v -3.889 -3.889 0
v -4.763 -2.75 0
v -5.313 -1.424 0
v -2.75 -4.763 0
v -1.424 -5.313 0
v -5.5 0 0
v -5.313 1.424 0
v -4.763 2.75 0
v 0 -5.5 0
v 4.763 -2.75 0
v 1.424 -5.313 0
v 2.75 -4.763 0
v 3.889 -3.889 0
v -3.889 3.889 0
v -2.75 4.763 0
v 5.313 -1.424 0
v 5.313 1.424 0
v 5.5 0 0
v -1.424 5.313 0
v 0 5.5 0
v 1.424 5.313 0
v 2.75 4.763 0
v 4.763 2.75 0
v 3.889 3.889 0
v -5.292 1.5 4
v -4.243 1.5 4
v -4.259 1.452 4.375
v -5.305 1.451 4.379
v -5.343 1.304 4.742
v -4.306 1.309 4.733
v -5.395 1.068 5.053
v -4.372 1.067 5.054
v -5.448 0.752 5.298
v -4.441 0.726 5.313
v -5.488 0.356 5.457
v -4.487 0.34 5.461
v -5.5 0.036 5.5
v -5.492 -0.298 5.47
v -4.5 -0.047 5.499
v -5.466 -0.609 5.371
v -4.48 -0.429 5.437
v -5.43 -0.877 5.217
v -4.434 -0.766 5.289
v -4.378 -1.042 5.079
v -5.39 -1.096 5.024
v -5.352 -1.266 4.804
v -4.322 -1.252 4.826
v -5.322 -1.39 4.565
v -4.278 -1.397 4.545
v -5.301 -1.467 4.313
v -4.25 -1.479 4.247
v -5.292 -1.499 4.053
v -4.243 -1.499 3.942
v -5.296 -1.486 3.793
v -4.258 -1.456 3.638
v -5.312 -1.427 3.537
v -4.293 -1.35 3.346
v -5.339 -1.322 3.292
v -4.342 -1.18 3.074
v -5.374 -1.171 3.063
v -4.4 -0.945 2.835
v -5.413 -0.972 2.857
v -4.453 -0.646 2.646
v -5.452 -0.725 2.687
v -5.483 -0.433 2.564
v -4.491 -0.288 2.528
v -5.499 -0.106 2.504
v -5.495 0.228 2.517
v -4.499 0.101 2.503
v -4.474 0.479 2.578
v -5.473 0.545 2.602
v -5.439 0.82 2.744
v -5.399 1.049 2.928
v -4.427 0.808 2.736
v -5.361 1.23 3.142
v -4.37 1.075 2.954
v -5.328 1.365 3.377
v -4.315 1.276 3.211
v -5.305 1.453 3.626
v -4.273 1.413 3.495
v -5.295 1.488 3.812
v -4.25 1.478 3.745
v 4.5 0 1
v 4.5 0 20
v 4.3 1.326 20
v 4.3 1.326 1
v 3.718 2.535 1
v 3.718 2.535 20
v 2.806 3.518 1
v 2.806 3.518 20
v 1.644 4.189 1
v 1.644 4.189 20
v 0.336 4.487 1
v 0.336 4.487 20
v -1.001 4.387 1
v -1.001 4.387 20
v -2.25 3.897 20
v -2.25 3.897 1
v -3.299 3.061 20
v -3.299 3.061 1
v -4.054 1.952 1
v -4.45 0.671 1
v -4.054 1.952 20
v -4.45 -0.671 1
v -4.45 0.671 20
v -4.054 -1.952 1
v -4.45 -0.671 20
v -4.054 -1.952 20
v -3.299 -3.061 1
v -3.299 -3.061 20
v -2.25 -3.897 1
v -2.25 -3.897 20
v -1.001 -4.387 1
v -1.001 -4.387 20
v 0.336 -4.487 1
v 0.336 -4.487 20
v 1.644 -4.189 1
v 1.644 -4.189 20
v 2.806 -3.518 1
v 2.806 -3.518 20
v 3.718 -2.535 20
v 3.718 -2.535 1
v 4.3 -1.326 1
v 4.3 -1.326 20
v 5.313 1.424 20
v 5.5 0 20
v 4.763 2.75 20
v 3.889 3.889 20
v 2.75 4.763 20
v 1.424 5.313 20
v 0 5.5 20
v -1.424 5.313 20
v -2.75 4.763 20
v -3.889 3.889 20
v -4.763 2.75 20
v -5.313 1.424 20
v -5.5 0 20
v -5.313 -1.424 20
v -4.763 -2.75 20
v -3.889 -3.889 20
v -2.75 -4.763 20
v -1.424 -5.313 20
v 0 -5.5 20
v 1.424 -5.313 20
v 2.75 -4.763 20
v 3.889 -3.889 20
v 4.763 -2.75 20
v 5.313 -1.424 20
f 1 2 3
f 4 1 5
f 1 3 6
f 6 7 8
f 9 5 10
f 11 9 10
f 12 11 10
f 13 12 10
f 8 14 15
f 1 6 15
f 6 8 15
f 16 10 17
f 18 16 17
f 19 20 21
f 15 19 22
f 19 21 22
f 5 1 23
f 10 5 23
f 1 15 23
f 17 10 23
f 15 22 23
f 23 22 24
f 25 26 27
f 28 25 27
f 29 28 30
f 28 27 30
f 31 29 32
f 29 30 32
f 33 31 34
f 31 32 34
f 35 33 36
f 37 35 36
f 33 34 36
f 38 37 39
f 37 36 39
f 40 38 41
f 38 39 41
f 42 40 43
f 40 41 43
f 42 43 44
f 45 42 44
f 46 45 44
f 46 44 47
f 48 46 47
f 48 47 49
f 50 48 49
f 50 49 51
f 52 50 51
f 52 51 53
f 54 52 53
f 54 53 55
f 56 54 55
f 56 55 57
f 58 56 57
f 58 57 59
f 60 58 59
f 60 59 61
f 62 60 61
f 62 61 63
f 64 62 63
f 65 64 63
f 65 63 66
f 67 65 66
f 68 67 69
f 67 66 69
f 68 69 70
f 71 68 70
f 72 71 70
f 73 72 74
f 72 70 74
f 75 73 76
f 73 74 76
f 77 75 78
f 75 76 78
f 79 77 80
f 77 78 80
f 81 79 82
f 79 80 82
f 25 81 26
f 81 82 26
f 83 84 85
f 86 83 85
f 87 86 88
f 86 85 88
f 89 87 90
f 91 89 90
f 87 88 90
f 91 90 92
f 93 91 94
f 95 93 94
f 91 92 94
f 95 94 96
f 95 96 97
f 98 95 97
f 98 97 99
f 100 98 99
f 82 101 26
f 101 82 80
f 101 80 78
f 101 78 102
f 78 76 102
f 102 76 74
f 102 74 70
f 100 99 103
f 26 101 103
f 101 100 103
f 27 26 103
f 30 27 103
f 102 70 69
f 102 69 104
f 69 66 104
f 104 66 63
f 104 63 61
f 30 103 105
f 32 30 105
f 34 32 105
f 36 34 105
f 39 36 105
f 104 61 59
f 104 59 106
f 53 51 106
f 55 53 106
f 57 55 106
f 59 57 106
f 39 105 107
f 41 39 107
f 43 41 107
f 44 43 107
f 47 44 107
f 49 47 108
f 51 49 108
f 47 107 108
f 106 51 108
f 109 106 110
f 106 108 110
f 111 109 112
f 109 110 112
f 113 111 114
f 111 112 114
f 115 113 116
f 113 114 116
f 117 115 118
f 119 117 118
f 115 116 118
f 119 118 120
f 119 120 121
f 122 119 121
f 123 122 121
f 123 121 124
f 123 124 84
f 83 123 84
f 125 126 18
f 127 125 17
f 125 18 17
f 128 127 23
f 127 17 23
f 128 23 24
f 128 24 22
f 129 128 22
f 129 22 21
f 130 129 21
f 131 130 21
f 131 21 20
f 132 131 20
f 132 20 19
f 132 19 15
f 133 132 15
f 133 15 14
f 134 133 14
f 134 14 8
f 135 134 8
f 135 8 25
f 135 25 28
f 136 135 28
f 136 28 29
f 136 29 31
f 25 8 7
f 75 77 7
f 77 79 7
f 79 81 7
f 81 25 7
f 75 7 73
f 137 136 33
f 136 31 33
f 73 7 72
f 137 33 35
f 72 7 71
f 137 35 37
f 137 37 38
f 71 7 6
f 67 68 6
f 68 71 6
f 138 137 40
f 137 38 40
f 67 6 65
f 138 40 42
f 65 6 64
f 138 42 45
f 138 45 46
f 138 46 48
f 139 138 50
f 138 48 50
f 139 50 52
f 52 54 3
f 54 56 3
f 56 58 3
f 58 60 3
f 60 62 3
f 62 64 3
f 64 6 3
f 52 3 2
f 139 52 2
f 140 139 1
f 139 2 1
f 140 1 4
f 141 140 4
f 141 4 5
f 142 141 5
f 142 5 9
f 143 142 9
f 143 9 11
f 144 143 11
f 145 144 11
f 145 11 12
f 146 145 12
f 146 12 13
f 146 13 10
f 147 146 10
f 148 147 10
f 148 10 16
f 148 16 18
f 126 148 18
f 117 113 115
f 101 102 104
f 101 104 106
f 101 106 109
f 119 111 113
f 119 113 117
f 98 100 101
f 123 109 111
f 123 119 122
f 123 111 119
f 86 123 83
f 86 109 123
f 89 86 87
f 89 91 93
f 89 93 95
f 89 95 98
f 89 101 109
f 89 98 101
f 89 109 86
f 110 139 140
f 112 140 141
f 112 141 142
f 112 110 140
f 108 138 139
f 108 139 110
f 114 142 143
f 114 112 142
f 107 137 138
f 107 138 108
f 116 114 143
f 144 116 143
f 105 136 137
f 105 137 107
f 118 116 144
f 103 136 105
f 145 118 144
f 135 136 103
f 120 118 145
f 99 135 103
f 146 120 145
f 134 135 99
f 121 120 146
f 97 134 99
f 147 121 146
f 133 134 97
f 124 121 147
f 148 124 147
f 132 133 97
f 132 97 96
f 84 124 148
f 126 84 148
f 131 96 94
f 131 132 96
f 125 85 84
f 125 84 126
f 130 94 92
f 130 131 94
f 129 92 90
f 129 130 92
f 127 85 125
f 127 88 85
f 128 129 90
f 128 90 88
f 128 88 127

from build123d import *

# Parameters (mm, degrees)
F0_R     = 5.5
F1_DEPTH = 20
F2_R     = 4.5
F3_DEPTH = 19
F4_R     = 1.5
F5_DEPTH = 25


with BuildPart() as f1:
    # F0 (on Top) → F1 (new body)
    with BuildSketch(Plane.XY):
        Circle(F0_R)
    extrude(amount=F1_DEPTH)

    # F2 (on face) → F3 (cut)
    with BuildSketch(Plane.XY.offset(20)):
        Circle(F2_R)
    extrude(amount=-F3_DEPTH, mode=Mode.SUBTRACT)

    # F4 (on Right) → F5 (cut)
    with BuildSketch(Plane.YZ):
        with Locations((0, 4)):
            Circle(F4_R)
    extrude(amount=-F5_DEPTH, mode=Mode.SUBTRACT)


solid = f1.part
